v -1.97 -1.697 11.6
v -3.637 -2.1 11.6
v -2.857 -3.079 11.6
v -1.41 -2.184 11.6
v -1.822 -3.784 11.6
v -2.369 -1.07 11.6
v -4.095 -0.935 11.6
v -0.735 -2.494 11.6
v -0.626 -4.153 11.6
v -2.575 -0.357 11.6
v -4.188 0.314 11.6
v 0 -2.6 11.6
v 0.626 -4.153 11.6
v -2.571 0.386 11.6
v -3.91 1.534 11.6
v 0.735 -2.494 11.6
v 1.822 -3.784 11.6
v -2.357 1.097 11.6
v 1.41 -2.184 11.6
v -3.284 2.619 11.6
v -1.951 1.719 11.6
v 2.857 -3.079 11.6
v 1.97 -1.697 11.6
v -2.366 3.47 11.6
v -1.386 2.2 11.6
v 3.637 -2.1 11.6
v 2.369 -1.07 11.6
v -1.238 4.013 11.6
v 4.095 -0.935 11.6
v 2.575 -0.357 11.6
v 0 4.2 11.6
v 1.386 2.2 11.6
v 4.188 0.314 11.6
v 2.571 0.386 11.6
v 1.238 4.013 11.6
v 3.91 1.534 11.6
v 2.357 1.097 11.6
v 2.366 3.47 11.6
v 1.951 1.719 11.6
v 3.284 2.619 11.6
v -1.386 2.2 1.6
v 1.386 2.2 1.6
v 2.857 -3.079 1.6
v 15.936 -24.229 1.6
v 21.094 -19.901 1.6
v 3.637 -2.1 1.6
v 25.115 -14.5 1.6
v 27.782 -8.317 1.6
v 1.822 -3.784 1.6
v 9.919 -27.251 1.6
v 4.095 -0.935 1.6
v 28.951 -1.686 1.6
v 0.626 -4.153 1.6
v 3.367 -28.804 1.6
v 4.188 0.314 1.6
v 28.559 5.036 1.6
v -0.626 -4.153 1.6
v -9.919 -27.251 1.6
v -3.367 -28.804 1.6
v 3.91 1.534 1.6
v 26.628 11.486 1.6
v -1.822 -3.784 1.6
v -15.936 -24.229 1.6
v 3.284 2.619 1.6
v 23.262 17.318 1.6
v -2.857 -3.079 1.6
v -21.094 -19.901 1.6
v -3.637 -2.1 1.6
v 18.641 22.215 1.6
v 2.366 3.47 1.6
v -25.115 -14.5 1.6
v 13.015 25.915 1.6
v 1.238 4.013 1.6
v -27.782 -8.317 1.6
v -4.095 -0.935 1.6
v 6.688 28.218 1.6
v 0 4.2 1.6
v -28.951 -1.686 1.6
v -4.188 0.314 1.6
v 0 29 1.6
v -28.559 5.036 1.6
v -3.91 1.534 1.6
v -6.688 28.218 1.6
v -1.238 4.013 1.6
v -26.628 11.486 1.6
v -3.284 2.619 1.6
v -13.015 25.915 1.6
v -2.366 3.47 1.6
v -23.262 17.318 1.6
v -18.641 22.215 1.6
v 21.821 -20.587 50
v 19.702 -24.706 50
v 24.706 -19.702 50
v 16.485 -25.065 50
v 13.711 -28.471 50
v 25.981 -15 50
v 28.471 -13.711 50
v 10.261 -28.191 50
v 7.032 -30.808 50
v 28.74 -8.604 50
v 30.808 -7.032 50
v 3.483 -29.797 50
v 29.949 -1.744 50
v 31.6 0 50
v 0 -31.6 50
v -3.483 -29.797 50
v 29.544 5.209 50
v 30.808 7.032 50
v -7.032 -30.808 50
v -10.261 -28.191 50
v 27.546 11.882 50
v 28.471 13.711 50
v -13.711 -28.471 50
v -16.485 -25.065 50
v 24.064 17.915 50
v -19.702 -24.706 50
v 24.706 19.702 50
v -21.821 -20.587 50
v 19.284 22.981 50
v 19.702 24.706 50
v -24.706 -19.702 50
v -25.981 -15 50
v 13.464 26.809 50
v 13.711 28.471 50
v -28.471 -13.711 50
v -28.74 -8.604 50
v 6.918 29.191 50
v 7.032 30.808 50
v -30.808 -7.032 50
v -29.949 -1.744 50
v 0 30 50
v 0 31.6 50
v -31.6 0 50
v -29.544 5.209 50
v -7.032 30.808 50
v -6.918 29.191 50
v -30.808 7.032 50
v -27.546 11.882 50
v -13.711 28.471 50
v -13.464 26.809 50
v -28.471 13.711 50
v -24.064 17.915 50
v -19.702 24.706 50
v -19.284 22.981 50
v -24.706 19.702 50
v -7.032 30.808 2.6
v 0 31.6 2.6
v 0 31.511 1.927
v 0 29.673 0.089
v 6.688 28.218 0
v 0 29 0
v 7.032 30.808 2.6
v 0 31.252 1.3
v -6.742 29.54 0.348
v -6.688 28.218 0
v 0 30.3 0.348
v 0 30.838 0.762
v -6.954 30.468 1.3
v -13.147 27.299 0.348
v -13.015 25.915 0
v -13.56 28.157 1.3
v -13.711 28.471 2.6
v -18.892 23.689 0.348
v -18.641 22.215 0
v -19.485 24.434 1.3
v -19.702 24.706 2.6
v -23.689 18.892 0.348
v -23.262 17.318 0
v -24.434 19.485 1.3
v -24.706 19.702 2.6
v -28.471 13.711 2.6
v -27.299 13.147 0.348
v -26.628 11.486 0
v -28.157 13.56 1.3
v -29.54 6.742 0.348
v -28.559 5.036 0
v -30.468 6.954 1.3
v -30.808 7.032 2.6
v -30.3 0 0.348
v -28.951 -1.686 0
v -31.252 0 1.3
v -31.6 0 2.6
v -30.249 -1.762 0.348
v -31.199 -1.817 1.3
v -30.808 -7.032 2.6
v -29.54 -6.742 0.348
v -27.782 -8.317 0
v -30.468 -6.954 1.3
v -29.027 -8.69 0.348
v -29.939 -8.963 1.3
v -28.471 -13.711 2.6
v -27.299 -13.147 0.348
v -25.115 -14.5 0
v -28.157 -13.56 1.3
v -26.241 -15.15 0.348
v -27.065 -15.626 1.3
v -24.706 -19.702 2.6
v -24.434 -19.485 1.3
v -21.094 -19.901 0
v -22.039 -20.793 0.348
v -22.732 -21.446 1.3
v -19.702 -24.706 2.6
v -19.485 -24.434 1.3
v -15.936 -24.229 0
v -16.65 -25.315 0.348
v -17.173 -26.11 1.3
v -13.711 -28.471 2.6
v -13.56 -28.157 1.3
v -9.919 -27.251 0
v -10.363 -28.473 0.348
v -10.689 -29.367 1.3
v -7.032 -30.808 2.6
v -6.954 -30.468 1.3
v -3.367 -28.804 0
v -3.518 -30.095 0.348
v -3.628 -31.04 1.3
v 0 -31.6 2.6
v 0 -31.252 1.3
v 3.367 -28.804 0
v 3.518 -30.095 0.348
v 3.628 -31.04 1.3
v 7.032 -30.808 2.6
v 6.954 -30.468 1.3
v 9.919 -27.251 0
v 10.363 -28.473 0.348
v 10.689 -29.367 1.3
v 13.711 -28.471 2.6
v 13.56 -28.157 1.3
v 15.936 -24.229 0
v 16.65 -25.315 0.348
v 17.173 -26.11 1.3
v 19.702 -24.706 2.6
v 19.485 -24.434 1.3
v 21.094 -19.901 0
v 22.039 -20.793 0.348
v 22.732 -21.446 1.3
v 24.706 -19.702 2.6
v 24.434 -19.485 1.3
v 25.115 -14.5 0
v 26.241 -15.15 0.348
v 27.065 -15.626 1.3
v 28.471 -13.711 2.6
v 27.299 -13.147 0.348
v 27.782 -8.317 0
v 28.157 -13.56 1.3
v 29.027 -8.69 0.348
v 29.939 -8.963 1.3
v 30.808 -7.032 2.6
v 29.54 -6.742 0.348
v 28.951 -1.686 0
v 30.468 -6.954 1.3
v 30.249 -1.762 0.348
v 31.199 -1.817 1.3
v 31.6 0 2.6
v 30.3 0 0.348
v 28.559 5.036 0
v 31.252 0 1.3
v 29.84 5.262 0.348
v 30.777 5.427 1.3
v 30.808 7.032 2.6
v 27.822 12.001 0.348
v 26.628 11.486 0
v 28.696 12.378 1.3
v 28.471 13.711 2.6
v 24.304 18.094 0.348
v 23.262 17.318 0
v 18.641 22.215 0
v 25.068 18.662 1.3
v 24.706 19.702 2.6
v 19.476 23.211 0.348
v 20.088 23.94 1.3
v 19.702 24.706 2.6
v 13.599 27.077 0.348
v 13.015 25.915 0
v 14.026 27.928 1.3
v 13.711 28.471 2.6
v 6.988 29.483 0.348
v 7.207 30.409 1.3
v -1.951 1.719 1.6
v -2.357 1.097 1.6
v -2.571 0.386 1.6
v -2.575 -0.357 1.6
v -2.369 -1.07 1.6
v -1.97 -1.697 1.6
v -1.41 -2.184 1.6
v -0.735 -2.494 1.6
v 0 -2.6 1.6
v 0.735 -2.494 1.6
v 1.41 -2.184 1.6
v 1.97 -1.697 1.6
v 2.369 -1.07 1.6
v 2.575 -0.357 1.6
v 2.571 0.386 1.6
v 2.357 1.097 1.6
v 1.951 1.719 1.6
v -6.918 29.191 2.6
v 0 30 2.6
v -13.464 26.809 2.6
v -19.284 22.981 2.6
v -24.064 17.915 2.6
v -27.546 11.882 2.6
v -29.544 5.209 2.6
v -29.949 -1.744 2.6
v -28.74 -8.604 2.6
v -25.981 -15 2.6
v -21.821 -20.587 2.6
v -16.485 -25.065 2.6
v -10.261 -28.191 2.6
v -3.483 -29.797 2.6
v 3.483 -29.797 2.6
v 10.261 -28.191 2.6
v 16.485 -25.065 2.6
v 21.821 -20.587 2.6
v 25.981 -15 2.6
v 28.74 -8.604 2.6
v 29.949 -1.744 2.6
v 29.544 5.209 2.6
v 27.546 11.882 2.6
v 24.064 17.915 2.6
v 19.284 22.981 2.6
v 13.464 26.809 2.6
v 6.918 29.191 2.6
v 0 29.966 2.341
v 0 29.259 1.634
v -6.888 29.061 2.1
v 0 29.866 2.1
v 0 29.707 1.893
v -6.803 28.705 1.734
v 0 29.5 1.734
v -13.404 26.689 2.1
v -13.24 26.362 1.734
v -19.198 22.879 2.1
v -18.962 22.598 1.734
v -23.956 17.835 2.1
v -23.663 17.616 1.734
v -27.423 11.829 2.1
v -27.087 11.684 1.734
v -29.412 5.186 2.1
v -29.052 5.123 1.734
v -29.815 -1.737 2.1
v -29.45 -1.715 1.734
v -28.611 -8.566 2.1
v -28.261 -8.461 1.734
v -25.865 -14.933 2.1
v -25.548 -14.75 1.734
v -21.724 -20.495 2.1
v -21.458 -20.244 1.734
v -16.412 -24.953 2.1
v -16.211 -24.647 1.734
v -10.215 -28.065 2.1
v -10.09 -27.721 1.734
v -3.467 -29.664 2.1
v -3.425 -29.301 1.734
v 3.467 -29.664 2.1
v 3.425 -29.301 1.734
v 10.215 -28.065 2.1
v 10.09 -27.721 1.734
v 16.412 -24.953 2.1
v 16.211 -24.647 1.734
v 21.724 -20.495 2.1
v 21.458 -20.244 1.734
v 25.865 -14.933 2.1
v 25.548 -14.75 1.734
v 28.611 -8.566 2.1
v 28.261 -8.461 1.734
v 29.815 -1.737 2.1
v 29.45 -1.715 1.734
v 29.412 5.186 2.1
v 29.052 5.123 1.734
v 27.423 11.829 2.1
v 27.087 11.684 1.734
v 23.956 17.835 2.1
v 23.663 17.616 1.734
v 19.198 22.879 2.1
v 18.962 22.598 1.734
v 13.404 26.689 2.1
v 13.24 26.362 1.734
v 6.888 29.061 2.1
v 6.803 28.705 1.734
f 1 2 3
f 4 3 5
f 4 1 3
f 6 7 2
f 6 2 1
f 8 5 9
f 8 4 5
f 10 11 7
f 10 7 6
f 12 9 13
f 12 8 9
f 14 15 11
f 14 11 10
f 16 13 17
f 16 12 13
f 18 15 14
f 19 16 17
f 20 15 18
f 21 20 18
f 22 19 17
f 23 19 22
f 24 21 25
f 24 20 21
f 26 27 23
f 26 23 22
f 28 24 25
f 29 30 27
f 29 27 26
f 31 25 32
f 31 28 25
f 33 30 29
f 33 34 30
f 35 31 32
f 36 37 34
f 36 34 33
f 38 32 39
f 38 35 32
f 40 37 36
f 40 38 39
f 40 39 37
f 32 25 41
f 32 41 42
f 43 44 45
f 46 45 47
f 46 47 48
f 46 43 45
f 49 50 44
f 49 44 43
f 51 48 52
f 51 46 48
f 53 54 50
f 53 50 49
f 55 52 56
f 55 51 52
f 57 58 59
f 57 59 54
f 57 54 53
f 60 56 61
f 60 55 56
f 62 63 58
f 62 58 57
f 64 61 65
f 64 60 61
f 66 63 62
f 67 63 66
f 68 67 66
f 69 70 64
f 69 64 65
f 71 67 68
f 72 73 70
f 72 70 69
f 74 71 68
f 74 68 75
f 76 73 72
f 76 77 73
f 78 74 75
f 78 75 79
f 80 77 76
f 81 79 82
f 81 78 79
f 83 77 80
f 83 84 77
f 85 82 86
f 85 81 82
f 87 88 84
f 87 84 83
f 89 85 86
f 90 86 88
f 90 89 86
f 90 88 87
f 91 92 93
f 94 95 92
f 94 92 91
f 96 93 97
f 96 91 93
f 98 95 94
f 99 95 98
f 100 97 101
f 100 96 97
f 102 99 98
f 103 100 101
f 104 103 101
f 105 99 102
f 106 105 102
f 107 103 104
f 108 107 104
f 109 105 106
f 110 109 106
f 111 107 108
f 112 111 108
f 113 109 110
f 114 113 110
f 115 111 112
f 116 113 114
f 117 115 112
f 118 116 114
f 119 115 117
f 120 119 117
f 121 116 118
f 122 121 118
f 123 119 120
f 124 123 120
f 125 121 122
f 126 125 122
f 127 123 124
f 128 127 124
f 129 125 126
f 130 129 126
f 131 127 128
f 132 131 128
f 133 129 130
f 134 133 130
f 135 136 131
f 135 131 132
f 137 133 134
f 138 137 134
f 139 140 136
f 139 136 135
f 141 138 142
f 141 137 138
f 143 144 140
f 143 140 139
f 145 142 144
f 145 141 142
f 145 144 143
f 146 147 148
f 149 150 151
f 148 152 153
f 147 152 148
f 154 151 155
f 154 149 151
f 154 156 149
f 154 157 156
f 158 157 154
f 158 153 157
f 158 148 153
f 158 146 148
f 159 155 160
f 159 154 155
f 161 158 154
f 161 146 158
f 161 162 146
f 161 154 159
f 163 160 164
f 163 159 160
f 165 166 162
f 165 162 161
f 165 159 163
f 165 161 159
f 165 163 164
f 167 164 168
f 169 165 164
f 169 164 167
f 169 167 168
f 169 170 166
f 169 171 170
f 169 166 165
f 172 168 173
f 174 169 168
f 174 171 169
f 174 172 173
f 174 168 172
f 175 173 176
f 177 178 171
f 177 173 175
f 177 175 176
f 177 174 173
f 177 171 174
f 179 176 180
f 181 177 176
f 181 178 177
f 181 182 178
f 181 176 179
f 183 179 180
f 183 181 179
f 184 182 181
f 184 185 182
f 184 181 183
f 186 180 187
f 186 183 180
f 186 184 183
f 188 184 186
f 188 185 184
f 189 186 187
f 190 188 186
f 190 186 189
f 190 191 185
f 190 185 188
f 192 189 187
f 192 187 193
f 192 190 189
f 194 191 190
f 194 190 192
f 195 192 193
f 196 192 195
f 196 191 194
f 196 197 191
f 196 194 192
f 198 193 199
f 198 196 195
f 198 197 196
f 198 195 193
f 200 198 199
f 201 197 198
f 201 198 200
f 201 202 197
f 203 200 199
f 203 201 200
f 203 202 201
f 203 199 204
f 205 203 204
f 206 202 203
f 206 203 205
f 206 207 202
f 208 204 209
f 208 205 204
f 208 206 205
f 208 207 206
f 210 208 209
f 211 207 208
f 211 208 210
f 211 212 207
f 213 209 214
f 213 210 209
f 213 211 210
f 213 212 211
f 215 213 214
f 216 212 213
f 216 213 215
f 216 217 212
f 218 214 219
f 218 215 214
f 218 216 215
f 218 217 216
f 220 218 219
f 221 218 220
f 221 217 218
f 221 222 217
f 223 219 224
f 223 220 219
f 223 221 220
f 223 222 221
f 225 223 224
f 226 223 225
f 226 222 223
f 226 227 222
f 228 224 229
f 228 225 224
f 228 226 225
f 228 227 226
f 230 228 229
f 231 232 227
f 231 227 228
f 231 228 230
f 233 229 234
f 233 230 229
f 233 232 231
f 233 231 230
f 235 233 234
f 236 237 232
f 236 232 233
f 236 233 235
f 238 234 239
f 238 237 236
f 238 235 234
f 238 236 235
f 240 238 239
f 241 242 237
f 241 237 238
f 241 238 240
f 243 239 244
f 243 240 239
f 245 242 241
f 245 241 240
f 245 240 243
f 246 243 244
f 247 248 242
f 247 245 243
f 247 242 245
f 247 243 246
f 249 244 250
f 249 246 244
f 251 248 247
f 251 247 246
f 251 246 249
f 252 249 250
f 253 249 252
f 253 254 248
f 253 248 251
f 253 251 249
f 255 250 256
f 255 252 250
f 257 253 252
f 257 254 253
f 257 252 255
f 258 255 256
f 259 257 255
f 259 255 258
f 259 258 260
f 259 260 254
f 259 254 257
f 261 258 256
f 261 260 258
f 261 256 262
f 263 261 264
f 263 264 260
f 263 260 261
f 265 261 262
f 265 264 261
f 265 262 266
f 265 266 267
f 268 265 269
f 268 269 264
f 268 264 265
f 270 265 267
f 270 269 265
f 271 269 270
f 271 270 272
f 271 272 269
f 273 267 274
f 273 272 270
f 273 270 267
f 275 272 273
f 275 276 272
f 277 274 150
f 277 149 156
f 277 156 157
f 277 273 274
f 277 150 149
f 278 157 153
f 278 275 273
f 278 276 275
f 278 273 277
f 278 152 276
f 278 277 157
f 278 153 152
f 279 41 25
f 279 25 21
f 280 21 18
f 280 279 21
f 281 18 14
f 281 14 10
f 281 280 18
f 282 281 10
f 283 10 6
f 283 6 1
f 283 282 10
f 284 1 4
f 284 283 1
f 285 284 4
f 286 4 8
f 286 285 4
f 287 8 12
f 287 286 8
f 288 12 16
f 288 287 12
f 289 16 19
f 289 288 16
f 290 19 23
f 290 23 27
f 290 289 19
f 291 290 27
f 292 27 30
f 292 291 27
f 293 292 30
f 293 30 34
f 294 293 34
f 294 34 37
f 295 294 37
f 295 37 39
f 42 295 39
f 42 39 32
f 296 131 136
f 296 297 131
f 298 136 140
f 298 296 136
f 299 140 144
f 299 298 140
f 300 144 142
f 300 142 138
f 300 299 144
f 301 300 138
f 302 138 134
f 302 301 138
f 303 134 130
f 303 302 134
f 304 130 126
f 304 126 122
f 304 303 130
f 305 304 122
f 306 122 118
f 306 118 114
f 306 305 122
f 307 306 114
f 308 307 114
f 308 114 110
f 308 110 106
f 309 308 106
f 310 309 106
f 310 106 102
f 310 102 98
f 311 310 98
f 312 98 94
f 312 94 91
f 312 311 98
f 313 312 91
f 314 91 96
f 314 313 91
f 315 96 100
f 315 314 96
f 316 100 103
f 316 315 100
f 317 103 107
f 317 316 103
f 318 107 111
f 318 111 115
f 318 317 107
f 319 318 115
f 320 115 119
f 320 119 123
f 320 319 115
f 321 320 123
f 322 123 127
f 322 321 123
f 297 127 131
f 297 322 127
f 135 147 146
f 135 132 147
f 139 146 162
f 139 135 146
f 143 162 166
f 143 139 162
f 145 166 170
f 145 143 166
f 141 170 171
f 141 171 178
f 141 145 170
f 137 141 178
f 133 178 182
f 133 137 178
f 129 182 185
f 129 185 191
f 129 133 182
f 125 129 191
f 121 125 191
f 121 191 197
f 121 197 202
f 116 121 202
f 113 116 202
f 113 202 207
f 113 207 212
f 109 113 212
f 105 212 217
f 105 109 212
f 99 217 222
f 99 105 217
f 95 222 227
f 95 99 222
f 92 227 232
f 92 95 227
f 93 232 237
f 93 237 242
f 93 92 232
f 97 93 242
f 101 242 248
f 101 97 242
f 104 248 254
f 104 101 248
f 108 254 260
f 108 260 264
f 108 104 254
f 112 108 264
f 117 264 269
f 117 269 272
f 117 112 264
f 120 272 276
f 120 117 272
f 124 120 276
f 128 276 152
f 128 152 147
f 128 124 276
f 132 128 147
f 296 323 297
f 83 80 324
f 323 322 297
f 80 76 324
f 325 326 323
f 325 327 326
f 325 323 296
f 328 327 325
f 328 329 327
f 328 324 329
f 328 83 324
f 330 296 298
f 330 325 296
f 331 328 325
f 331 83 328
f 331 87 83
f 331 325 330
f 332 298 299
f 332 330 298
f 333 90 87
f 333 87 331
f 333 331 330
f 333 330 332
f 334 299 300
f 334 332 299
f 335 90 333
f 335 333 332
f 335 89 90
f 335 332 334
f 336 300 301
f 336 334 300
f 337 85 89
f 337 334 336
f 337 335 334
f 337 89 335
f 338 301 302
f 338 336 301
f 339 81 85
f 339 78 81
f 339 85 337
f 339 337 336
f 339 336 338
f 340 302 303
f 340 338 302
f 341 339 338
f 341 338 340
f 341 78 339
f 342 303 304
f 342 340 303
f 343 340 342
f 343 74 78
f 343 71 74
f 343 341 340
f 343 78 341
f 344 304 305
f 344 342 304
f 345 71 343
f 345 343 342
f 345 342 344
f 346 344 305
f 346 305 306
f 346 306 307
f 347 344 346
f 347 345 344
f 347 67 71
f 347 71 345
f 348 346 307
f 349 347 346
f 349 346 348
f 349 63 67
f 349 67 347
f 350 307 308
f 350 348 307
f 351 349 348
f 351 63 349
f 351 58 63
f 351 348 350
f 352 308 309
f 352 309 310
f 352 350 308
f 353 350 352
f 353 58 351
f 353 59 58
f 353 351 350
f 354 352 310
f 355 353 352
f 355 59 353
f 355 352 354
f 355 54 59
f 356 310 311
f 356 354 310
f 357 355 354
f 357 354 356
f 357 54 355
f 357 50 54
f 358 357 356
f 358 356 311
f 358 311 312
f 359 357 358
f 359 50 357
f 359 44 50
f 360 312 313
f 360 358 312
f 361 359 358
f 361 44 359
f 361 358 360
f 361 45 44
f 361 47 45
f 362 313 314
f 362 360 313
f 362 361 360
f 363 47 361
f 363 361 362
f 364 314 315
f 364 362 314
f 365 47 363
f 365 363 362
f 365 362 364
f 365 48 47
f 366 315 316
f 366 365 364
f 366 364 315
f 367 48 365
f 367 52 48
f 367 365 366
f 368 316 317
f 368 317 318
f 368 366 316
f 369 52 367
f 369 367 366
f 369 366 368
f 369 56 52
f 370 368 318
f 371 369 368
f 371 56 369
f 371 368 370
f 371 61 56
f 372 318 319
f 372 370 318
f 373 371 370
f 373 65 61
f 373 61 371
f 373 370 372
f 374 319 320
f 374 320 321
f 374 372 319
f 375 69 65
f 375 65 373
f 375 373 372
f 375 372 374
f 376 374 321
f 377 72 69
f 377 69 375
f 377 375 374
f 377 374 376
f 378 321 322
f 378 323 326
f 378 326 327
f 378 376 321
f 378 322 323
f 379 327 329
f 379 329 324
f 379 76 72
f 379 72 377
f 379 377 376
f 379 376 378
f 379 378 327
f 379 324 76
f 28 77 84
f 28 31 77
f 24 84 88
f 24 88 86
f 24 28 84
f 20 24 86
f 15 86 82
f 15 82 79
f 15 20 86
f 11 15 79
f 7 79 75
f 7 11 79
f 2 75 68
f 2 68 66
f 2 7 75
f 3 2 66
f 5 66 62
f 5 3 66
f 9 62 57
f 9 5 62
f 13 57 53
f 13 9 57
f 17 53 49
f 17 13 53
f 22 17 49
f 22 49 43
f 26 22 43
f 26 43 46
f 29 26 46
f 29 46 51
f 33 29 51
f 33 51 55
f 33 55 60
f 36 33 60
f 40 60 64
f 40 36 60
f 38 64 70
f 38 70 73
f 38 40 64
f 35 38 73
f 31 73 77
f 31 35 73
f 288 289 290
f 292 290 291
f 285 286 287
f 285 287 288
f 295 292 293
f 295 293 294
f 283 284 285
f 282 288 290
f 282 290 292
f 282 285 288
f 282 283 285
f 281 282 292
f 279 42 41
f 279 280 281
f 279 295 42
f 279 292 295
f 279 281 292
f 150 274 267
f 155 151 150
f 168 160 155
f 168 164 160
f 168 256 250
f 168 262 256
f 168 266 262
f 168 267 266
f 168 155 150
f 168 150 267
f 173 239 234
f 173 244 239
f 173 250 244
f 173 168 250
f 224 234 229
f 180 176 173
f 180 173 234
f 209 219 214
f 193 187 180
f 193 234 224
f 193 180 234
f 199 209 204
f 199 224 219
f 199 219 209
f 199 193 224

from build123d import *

# Parameters (mm, degrees)
F3_DEPTH = 10


with BuildPart() as f1:
    # F0 (on Right) → F1 (revolve)
    with BuildSketch(Plane.YZ):
        with BuildLine():
            Line((0, 1.6), (0, 0))
            Line((0, 0), (29, 0))
            ThreePointArc((29, 0), (30.838478, 0.761522), (31.6, 2.6))
            Line((31.6, 2.6), (31.6, 50))
            Line((31.6, 50), (30, 50))
            Line((30, 50), (30, 2.6))
            ThreePointArc((30, 2.6), (29.707107, 1.892893), (29, 1.6))
            Line((29, 1.6), (4.2, 1.6))
            Line((4.2, 1.6), (4.2, 11.6))
            Line((4.2, 11.6), (2.6, 11.6))
            Line((2.6, 11.6), (2.6, 1.6))
            Line((2.6, 1.6), (0, 1.6))
        make_face()
    revolve(axis=Axis((0, 0, 0.8), (0, 0, 1)))

    # F2 (on face) → F3 (join, through all)
    with BuildSketch(Plane.XY.offset(11.6)):
        with BuildLine():
            ThreePointArc((1.385641, 2.2), (0, 2.6), (-1.385641, 2.2))
            Line((-1.385641, 2.2), (1.385641, 2.2))
        make_face()
    extrude(amount=-F3_DEPTH)


solid = f1.part
